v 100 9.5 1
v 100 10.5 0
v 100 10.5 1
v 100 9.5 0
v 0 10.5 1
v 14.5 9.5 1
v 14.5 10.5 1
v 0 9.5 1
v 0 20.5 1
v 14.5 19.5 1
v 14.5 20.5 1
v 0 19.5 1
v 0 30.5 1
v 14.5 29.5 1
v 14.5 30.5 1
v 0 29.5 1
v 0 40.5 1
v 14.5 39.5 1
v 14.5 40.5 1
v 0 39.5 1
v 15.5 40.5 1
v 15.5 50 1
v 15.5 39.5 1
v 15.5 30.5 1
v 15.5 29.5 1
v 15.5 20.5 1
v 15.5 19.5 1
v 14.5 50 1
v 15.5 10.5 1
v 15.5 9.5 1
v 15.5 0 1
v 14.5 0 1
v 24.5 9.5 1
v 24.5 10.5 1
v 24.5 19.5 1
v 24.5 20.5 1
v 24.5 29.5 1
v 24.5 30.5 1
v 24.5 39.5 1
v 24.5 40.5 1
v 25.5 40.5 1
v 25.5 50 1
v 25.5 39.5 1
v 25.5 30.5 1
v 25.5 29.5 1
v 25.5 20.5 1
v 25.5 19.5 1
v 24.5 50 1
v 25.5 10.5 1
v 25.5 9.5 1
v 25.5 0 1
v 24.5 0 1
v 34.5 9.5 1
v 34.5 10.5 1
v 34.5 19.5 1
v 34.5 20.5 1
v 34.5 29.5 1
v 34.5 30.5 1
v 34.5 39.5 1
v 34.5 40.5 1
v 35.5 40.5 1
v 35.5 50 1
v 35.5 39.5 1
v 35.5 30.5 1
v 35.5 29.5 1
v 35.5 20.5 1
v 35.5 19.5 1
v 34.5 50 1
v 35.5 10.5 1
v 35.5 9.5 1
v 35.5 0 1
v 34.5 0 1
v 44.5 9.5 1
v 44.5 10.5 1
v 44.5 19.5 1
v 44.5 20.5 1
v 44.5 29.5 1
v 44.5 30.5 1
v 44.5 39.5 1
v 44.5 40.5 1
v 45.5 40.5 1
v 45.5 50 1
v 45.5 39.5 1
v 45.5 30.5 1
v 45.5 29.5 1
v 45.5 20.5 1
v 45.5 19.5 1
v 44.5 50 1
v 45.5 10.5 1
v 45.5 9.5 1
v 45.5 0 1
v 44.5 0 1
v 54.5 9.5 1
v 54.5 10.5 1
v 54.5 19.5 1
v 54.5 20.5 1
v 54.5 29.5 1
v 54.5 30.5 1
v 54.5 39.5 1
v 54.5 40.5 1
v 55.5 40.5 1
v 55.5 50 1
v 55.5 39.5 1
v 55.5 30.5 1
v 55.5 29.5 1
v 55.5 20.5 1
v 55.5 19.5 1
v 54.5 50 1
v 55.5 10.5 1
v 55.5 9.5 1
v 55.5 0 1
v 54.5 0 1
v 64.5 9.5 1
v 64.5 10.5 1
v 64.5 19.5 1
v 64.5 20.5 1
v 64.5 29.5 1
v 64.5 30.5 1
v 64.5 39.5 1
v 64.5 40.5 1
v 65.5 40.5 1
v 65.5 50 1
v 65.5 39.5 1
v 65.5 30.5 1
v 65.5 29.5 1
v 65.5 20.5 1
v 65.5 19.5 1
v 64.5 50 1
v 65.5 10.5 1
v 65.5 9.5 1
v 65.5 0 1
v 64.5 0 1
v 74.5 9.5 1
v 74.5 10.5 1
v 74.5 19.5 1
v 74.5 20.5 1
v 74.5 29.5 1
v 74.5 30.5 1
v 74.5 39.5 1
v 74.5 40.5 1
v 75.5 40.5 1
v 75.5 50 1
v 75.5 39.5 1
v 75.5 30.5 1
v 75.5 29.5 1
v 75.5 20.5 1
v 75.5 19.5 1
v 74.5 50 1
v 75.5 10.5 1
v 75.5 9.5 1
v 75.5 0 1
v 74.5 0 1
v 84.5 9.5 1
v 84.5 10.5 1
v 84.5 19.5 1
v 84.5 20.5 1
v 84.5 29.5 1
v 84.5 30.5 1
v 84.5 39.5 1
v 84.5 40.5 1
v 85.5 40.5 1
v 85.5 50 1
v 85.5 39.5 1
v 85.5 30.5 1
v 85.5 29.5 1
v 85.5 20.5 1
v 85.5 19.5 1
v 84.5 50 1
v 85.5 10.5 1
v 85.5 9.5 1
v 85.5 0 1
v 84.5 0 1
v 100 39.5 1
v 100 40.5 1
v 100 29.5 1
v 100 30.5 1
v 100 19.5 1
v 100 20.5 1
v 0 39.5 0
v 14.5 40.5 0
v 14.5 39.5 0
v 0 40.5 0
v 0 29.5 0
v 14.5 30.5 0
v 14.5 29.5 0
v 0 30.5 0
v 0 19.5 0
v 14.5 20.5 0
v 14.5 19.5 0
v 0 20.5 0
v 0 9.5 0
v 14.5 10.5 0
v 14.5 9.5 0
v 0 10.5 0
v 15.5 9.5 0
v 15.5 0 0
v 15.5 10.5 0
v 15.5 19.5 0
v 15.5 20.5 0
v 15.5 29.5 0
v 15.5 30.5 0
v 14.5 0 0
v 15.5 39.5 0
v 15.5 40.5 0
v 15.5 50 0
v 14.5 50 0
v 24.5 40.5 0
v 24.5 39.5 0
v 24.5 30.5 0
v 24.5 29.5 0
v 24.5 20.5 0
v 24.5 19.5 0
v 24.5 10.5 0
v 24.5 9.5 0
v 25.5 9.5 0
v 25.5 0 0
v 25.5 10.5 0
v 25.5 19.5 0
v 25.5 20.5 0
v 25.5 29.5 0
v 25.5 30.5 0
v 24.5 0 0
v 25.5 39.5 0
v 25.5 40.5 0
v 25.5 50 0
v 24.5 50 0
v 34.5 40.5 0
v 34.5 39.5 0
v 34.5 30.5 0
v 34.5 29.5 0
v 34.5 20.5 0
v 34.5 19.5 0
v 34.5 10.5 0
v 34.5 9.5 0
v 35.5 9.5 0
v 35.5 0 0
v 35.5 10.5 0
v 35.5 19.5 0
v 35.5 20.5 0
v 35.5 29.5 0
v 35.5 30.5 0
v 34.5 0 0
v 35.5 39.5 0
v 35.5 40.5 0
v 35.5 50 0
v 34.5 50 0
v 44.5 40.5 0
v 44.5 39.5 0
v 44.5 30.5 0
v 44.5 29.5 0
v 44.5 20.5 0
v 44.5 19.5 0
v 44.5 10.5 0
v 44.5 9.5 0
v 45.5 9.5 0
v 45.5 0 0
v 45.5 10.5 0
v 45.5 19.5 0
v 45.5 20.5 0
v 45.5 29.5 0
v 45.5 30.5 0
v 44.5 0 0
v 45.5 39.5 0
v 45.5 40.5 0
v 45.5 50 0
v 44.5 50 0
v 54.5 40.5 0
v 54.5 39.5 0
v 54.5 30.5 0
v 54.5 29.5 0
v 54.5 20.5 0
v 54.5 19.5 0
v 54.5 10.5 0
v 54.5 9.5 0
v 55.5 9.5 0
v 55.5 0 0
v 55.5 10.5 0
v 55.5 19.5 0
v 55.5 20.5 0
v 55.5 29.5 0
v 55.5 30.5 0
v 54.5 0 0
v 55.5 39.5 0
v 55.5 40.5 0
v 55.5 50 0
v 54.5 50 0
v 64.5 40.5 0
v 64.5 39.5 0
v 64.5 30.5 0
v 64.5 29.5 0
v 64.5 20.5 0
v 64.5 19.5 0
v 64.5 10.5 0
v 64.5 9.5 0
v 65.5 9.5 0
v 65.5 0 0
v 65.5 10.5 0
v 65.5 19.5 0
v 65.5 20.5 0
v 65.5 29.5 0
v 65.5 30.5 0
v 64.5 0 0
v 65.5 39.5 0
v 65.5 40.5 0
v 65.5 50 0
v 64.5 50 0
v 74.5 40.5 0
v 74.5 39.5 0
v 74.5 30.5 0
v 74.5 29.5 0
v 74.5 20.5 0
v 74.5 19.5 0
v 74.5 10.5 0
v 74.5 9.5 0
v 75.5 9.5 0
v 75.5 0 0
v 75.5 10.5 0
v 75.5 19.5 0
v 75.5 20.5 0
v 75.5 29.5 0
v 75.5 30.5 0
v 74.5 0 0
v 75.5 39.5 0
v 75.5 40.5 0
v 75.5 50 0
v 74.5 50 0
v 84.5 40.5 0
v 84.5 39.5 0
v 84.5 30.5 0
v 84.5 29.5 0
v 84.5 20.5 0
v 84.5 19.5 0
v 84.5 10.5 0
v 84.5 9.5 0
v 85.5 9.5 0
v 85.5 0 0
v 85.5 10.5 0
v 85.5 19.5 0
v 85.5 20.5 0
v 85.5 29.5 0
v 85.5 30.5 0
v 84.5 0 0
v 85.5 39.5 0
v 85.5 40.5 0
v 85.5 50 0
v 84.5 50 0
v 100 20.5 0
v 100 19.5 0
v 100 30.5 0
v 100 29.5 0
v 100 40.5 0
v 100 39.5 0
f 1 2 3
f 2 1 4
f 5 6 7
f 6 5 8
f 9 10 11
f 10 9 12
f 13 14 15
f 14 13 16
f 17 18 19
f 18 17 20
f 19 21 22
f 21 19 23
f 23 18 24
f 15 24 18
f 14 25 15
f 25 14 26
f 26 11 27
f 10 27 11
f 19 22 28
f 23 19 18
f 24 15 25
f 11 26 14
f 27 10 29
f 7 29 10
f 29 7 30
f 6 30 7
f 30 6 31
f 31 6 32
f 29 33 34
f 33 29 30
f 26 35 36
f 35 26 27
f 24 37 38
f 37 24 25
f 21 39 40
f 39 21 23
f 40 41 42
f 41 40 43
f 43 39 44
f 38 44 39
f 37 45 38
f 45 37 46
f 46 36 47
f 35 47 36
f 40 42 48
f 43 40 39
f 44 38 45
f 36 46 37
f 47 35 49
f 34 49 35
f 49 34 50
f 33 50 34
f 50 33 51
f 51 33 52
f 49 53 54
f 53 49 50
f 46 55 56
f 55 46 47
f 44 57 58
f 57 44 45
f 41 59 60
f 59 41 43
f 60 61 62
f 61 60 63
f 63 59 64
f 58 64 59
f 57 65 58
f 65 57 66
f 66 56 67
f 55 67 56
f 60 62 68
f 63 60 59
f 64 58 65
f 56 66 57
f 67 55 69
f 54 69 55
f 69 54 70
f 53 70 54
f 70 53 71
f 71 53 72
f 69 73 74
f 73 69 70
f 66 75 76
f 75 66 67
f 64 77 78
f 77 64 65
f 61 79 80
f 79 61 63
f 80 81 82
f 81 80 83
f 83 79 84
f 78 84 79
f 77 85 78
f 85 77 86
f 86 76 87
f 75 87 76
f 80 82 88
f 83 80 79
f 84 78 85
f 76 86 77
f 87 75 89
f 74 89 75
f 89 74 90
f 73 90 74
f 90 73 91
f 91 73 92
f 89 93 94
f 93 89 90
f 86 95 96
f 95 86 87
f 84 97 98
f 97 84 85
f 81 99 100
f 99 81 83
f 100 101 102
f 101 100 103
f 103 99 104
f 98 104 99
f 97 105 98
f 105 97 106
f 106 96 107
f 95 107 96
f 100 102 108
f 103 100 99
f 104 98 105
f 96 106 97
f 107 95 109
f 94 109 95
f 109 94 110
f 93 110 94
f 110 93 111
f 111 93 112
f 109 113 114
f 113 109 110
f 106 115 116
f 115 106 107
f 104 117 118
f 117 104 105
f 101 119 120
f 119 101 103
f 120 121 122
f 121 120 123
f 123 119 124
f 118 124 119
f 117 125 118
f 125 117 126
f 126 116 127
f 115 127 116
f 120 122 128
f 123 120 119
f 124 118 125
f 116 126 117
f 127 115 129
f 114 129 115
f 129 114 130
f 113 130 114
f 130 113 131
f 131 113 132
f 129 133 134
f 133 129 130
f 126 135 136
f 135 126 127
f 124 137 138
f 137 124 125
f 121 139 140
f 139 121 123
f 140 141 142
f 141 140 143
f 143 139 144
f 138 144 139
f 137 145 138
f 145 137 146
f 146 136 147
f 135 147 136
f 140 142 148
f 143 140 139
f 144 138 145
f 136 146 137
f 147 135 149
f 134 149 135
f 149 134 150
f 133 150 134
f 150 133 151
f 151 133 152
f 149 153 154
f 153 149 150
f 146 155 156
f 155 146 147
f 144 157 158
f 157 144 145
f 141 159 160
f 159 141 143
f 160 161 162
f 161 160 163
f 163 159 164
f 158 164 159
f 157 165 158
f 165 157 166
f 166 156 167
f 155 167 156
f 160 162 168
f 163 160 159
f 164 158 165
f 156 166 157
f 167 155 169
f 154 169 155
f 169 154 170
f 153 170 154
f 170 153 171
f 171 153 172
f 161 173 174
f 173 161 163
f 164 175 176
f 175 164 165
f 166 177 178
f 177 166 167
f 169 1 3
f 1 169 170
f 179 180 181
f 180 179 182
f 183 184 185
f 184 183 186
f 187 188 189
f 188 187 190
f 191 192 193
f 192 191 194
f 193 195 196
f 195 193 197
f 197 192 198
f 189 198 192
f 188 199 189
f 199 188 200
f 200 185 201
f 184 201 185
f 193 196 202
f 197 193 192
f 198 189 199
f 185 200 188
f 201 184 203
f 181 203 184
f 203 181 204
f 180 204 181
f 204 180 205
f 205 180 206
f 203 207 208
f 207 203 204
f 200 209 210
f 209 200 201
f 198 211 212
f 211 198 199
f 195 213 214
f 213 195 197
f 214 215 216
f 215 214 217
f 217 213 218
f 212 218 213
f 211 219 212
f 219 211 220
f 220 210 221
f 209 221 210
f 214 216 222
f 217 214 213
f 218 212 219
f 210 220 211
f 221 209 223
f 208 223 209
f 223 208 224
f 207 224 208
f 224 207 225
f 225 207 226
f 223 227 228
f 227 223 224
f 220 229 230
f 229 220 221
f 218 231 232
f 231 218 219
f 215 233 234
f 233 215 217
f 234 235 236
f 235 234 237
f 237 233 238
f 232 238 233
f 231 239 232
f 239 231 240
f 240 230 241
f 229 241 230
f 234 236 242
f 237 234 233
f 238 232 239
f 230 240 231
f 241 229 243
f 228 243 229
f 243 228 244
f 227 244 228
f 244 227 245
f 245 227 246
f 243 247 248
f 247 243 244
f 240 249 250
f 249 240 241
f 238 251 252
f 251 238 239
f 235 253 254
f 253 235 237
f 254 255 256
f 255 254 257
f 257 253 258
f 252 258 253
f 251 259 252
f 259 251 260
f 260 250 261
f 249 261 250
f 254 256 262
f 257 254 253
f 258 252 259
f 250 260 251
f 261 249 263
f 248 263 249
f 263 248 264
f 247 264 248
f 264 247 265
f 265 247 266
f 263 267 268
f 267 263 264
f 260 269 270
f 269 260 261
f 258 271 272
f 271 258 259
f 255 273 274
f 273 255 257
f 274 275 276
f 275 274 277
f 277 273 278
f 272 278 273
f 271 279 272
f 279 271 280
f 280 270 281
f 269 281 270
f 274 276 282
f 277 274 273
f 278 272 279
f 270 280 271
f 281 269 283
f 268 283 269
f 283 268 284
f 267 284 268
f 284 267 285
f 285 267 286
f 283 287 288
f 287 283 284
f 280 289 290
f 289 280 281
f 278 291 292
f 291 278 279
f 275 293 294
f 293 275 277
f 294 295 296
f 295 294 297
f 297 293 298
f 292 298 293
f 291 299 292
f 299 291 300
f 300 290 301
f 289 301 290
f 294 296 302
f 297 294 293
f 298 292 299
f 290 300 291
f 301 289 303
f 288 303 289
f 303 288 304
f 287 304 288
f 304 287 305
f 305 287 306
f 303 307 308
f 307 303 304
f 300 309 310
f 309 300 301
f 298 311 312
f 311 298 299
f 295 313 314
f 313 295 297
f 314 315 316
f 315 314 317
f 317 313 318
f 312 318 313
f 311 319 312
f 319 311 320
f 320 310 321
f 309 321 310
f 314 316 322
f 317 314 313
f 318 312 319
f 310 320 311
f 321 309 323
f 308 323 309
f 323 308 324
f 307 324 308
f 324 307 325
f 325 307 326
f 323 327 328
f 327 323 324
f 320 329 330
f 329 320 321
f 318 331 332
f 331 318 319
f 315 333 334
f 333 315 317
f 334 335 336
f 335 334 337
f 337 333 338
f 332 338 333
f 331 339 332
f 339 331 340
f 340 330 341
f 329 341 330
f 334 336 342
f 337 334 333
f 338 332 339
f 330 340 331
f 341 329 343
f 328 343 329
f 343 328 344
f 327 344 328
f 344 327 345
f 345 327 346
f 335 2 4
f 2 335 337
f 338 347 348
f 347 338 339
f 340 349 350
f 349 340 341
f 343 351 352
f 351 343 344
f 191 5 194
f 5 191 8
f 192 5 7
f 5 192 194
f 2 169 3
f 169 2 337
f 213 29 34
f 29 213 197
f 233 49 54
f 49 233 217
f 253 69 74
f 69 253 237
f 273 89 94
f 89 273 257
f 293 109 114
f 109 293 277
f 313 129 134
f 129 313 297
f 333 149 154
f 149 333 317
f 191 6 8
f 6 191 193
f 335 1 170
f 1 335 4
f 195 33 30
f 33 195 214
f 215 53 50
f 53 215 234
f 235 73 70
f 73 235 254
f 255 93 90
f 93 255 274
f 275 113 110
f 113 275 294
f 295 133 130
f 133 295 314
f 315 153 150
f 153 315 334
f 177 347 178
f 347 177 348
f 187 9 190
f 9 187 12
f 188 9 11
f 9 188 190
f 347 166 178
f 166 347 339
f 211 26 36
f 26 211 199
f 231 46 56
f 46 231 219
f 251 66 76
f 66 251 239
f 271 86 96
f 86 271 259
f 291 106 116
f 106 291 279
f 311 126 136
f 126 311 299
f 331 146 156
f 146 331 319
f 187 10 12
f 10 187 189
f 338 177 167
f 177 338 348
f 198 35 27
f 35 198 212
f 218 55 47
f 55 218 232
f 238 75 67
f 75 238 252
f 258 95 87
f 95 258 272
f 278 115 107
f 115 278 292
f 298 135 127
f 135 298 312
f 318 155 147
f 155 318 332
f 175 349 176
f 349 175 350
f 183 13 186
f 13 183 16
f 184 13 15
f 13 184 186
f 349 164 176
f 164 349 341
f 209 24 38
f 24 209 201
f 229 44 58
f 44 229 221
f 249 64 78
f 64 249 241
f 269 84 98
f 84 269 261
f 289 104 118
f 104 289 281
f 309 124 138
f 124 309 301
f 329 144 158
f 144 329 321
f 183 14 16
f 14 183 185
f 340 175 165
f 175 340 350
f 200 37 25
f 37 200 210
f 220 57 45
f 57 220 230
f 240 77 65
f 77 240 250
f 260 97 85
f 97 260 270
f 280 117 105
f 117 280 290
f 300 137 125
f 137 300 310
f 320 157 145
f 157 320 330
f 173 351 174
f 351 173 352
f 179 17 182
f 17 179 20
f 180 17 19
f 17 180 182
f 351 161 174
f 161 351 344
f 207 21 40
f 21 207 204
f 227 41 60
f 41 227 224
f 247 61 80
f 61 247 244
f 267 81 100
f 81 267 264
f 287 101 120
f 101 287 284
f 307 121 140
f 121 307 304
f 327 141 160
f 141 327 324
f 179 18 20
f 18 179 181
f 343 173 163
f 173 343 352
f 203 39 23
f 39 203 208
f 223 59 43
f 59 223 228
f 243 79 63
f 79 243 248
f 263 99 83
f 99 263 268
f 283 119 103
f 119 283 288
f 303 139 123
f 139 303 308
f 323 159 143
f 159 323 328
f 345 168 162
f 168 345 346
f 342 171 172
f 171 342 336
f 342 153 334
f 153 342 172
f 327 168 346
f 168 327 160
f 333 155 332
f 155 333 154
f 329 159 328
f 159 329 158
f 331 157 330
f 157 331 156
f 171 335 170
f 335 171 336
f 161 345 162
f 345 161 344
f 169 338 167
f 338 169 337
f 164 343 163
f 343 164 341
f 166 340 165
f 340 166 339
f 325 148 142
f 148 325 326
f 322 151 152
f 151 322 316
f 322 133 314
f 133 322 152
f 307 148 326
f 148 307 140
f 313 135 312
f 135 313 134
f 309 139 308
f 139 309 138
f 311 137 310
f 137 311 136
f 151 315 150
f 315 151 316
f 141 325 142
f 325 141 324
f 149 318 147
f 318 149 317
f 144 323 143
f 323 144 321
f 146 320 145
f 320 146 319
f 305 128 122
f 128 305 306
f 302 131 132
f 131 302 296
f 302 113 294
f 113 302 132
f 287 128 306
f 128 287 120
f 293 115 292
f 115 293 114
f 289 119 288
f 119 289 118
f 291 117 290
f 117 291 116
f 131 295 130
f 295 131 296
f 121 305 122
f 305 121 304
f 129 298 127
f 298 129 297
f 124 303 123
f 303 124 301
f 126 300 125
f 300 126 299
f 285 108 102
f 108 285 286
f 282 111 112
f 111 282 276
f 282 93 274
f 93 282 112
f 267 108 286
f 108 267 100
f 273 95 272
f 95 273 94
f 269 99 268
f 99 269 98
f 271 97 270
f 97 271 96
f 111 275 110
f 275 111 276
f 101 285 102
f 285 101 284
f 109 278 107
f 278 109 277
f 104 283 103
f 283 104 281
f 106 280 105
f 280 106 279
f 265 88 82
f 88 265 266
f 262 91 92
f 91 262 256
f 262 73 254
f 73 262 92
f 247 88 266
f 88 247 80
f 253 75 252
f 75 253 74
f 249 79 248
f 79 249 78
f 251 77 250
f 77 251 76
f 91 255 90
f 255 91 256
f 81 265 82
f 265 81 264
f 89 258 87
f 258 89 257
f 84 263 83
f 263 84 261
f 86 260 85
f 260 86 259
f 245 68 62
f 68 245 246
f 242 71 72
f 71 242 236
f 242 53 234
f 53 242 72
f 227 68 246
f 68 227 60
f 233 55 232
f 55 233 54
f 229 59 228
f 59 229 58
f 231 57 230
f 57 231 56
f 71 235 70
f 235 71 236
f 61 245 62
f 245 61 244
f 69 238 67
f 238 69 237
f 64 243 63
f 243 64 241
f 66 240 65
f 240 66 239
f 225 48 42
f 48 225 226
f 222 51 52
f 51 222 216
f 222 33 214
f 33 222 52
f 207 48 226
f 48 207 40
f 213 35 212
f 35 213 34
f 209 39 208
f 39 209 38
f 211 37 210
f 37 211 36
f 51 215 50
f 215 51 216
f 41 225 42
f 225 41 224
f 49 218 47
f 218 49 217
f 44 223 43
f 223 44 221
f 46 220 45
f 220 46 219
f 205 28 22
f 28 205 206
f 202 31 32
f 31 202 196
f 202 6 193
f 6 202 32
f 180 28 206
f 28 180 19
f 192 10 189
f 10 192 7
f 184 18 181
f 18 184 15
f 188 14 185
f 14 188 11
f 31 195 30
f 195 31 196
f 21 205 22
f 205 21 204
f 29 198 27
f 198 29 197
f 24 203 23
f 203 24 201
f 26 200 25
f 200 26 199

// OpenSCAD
module bars(width, height, n, pitch, bar_width)
{
	for (i=[0:n-1])
		translate([0, (i-(n-1)/2)*pitch-bar_width/2, 0])
			cube([width, bar_width, height]);
}

module grid(width, depth, height, n_rows, n_cols, pitch=10, x_pitch=-1, y_pitch=-1, bar_width=1, x_bar_width=-1, y_bar_width=-1)
{
	x_pitch = x_pitch > 0 ? x_pitch : pitch;
	y_pitch = y_pitch > 0 ? y_pitch : pitch;
	x_bar_width = x_bar_width > 0 ? x_bar_width : bar_width;
	y_bar_width = y_bar_width > 0 ? y_bar_width : bar_width;

	translate( [0, depth/2, 0] )
		bars( width, height, n_rows, y_pitch, y_bar_width );
	translate( [width/2, 0, 0] )
		rotate([0,0,90])
			bars( depth, height, n_cols, x_pitch, x_bar_width) ;
}

grid(100, 50, 1, 4, 8);
